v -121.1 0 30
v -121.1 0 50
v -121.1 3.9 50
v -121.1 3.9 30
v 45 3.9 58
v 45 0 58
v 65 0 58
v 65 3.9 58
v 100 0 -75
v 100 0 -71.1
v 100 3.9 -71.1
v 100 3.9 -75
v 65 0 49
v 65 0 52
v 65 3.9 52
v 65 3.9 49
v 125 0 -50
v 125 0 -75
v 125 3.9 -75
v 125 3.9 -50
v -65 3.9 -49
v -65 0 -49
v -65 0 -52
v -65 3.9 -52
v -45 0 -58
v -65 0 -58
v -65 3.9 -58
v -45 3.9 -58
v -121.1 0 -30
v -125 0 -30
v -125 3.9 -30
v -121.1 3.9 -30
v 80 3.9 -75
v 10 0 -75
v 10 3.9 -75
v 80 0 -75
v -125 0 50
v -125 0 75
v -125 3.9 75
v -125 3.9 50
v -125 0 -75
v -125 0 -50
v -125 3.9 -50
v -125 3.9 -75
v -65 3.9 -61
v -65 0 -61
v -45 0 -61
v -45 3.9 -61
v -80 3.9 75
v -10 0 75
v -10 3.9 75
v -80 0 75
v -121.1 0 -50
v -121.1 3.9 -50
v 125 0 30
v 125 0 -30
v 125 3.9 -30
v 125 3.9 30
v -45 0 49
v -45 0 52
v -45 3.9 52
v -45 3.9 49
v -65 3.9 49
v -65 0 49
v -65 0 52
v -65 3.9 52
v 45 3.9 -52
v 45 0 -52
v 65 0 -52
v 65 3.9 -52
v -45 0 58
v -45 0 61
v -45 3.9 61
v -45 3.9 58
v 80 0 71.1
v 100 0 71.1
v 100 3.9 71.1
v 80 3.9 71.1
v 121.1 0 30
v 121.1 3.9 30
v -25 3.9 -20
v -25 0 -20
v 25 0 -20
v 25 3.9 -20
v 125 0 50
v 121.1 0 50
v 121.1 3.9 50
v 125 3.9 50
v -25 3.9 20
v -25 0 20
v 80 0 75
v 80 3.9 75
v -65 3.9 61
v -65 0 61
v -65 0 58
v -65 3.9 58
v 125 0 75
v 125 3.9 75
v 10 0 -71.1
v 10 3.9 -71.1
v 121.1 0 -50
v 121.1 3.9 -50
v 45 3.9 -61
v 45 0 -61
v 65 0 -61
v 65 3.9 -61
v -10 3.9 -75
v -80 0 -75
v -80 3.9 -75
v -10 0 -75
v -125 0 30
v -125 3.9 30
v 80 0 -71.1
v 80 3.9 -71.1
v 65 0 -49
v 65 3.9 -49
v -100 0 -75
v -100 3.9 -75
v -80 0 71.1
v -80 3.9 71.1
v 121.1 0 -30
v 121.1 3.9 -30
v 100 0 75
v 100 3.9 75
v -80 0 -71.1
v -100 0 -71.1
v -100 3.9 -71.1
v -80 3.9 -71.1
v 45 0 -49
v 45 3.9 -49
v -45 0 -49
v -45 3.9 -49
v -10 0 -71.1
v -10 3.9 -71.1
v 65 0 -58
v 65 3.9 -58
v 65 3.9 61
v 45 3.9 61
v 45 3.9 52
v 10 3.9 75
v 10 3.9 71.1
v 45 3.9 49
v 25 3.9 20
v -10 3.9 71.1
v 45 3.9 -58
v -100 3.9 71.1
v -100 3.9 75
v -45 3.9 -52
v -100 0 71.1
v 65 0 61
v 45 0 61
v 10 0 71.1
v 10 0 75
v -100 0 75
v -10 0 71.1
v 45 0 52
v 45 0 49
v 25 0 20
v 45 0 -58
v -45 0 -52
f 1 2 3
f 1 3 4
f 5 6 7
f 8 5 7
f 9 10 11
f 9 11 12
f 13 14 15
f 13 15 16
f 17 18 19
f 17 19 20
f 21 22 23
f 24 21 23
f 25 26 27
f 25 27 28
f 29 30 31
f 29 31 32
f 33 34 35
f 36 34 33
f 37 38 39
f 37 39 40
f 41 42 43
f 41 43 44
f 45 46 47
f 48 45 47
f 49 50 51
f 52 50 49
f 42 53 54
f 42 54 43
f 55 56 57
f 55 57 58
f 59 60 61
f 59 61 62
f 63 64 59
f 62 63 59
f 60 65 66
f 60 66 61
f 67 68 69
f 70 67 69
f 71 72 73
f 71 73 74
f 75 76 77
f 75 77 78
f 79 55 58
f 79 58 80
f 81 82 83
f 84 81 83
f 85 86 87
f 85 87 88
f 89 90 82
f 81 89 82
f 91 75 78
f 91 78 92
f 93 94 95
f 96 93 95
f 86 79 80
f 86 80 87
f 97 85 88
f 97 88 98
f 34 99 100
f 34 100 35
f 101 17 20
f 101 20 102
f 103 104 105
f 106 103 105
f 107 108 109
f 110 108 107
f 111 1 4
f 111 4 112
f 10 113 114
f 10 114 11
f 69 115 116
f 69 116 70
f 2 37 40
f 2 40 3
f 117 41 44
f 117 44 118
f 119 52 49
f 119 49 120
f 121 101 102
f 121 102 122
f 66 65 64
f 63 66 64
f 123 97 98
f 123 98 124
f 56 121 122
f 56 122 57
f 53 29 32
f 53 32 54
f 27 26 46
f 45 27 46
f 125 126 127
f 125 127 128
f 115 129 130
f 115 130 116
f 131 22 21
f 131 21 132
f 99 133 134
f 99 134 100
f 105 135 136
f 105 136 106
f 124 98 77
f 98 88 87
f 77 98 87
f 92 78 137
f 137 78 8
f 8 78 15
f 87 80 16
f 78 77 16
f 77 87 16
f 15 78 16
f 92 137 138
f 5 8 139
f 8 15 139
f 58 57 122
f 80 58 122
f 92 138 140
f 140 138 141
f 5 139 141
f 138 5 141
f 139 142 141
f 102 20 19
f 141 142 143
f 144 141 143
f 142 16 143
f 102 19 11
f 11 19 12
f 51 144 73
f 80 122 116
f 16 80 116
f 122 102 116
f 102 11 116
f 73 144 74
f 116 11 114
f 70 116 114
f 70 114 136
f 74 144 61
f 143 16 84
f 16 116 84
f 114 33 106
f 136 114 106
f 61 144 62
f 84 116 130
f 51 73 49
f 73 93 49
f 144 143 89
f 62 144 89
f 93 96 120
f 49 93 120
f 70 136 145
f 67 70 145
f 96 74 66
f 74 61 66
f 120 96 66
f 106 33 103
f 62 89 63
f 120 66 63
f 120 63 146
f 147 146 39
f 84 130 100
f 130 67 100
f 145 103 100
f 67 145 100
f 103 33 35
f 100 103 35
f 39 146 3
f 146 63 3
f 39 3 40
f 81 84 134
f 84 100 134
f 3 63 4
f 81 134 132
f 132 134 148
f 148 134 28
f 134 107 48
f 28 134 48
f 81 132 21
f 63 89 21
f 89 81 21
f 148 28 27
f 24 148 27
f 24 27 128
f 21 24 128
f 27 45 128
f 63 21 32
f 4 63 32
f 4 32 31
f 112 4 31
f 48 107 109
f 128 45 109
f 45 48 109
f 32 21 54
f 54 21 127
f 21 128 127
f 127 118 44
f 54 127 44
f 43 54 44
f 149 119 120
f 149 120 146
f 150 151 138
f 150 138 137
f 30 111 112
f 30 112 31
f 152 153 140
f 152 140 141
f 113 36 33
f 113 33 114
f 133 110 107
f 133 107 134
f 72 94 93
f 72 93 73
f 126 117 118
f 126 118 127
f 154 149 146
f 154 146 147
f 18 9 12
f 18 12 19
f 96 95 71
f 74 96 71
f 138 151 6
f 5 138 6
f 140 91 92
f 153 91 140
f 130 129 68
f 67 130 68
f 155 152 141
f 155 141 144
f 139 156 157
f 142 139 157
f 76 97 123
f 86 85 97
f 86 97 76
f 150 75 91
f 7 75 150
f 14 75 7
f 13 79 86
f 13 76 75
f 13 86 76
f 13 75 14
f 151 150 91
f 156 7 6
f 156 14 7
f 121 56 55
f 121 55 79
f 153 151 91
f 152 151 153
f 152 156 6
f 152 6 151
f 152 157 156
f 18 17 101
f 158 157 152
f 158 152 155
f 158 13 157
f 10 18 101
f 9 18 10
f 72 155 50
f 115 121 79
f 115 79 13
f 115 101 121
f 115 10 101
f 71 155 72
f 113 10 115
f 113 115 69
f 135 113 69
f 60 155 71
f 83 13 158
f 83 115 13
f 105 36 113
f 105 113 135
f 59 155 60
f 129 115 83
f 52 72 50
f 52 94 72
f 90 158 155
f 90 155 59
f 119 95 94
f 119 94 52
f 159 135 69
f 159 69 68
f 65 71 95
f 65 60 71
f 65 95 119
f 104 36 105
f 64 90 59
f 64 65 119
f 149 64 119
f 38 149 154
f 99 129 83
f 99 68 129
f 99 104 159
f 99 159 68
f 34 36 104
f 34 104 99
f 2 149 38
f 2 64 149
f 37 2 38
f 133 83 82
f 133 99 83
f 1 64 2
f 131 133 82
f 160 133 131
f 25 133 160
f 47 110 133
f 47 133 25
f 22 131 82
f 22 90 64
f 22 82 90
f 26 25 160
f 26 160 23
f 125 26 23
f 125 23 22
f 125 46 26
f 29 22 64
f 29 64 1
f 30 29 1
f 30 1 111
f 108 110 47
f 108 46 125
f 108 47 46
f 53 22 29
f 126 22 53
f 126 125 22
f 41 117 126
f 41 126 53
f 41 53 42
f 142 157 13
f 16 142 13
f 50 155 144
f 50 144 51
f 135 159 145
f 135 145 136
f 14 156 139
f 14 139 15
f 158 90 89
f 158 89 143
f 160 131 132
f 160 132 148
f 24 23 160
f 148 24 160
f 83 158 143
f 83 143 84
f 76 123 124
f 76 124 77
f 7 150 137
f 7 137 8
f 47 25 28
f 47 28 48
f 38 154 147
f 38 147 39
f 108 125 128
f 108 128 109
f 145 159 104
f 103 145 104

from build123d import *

# Parameters (mm, degrees)
SKETCH1_W           = 20
SKETCH1_H           = 3
SKETCH1_W_2         = 50
SKETCH1_H_2         = 40
BOSS_EXTRUDE1_DEPTH = 3.9


with BuildPart() as part:
    # Sketch1 → Boss-Extrude1 (new body)
    with BuildSketch(Plane(origin=(0, 0, 0), x_dir=(1, 0, 0), z_dir=(0, 1, 0))):
        Polygon((-125, 75), (-100, 75), (-100, 71.1), (-80, 71.1), (-80, 75), (-10, 75), (-10, 71.1), (10, 71.1), (10, 75), (80, 75), (80, 71.1), (100, 71.1), (100, 75), (125, 75), (125, 50), (121.1, 50), (121.1, 30), (125, 30), (125, -30), (121.1, -30), (121.1, -50), (125, -50), (125, -75), (100, -75), (100, -71.1), (80, -71.1), (80, -75), (10, -75), (10, -71.1), (-10, -71.1), (-10, -75), (-80, -75), (-80, -71.1), (-100, -71.1), (-100, -75), (-125, -75), (-125, -50), (-121.1, -50), (-121.1, -30), (-125, -30), (-125, 30), (-121.1, 30), (-121.1, 50), (-125, 50), align=None)
        with Locations((-55, -50.5)):
            Rectangle(SKETCH1_W, SKETCH1_H, mode=Mode.SUBTRACT)
        with Locations((-55, -59.5)):
            Rectangle(SKETCH1_W, SKETCH1_H, mode=Mode.SUBTRACT)
        Rectangle(SKETCH1_W_2, SKETCH1_H_2, mode=Mode.SUBTRACT)
        with Locations((55, -59.5)):
            Rectangle(SKETCH1_W, SKETCH1_H, mode=Mode.SUBTRACT)
        with Locations((55, -50.5)):
            Rectangle(SKETCH1_W, SKETCH1_H, mode=Mode.SUBTRACT)
        with Locations((55, 50.5)):
            Rectangle(SKETCH1_W, SKETCH1_H, mode=Mode.SUBTRACT)
        with Locations((55, 59.5)):
            Rectangle(SKETCH1_W, SKETCH1_H, mode=Mode.SUBTRACT)
        with Locations((-55, 59.5)):
            Rectangle(SKETCH1_W, SKETCH1_H, mode=Mode.SUBTRACT)
        with Locations((-55, 50.5)):
            Rectangle(SKETCH1_W, SKETCH1_H, mode=Mode.SUBTRACT)
    extrude(amount=BOSS_EXTRUDE1_DEPTH)


solid = part.part
